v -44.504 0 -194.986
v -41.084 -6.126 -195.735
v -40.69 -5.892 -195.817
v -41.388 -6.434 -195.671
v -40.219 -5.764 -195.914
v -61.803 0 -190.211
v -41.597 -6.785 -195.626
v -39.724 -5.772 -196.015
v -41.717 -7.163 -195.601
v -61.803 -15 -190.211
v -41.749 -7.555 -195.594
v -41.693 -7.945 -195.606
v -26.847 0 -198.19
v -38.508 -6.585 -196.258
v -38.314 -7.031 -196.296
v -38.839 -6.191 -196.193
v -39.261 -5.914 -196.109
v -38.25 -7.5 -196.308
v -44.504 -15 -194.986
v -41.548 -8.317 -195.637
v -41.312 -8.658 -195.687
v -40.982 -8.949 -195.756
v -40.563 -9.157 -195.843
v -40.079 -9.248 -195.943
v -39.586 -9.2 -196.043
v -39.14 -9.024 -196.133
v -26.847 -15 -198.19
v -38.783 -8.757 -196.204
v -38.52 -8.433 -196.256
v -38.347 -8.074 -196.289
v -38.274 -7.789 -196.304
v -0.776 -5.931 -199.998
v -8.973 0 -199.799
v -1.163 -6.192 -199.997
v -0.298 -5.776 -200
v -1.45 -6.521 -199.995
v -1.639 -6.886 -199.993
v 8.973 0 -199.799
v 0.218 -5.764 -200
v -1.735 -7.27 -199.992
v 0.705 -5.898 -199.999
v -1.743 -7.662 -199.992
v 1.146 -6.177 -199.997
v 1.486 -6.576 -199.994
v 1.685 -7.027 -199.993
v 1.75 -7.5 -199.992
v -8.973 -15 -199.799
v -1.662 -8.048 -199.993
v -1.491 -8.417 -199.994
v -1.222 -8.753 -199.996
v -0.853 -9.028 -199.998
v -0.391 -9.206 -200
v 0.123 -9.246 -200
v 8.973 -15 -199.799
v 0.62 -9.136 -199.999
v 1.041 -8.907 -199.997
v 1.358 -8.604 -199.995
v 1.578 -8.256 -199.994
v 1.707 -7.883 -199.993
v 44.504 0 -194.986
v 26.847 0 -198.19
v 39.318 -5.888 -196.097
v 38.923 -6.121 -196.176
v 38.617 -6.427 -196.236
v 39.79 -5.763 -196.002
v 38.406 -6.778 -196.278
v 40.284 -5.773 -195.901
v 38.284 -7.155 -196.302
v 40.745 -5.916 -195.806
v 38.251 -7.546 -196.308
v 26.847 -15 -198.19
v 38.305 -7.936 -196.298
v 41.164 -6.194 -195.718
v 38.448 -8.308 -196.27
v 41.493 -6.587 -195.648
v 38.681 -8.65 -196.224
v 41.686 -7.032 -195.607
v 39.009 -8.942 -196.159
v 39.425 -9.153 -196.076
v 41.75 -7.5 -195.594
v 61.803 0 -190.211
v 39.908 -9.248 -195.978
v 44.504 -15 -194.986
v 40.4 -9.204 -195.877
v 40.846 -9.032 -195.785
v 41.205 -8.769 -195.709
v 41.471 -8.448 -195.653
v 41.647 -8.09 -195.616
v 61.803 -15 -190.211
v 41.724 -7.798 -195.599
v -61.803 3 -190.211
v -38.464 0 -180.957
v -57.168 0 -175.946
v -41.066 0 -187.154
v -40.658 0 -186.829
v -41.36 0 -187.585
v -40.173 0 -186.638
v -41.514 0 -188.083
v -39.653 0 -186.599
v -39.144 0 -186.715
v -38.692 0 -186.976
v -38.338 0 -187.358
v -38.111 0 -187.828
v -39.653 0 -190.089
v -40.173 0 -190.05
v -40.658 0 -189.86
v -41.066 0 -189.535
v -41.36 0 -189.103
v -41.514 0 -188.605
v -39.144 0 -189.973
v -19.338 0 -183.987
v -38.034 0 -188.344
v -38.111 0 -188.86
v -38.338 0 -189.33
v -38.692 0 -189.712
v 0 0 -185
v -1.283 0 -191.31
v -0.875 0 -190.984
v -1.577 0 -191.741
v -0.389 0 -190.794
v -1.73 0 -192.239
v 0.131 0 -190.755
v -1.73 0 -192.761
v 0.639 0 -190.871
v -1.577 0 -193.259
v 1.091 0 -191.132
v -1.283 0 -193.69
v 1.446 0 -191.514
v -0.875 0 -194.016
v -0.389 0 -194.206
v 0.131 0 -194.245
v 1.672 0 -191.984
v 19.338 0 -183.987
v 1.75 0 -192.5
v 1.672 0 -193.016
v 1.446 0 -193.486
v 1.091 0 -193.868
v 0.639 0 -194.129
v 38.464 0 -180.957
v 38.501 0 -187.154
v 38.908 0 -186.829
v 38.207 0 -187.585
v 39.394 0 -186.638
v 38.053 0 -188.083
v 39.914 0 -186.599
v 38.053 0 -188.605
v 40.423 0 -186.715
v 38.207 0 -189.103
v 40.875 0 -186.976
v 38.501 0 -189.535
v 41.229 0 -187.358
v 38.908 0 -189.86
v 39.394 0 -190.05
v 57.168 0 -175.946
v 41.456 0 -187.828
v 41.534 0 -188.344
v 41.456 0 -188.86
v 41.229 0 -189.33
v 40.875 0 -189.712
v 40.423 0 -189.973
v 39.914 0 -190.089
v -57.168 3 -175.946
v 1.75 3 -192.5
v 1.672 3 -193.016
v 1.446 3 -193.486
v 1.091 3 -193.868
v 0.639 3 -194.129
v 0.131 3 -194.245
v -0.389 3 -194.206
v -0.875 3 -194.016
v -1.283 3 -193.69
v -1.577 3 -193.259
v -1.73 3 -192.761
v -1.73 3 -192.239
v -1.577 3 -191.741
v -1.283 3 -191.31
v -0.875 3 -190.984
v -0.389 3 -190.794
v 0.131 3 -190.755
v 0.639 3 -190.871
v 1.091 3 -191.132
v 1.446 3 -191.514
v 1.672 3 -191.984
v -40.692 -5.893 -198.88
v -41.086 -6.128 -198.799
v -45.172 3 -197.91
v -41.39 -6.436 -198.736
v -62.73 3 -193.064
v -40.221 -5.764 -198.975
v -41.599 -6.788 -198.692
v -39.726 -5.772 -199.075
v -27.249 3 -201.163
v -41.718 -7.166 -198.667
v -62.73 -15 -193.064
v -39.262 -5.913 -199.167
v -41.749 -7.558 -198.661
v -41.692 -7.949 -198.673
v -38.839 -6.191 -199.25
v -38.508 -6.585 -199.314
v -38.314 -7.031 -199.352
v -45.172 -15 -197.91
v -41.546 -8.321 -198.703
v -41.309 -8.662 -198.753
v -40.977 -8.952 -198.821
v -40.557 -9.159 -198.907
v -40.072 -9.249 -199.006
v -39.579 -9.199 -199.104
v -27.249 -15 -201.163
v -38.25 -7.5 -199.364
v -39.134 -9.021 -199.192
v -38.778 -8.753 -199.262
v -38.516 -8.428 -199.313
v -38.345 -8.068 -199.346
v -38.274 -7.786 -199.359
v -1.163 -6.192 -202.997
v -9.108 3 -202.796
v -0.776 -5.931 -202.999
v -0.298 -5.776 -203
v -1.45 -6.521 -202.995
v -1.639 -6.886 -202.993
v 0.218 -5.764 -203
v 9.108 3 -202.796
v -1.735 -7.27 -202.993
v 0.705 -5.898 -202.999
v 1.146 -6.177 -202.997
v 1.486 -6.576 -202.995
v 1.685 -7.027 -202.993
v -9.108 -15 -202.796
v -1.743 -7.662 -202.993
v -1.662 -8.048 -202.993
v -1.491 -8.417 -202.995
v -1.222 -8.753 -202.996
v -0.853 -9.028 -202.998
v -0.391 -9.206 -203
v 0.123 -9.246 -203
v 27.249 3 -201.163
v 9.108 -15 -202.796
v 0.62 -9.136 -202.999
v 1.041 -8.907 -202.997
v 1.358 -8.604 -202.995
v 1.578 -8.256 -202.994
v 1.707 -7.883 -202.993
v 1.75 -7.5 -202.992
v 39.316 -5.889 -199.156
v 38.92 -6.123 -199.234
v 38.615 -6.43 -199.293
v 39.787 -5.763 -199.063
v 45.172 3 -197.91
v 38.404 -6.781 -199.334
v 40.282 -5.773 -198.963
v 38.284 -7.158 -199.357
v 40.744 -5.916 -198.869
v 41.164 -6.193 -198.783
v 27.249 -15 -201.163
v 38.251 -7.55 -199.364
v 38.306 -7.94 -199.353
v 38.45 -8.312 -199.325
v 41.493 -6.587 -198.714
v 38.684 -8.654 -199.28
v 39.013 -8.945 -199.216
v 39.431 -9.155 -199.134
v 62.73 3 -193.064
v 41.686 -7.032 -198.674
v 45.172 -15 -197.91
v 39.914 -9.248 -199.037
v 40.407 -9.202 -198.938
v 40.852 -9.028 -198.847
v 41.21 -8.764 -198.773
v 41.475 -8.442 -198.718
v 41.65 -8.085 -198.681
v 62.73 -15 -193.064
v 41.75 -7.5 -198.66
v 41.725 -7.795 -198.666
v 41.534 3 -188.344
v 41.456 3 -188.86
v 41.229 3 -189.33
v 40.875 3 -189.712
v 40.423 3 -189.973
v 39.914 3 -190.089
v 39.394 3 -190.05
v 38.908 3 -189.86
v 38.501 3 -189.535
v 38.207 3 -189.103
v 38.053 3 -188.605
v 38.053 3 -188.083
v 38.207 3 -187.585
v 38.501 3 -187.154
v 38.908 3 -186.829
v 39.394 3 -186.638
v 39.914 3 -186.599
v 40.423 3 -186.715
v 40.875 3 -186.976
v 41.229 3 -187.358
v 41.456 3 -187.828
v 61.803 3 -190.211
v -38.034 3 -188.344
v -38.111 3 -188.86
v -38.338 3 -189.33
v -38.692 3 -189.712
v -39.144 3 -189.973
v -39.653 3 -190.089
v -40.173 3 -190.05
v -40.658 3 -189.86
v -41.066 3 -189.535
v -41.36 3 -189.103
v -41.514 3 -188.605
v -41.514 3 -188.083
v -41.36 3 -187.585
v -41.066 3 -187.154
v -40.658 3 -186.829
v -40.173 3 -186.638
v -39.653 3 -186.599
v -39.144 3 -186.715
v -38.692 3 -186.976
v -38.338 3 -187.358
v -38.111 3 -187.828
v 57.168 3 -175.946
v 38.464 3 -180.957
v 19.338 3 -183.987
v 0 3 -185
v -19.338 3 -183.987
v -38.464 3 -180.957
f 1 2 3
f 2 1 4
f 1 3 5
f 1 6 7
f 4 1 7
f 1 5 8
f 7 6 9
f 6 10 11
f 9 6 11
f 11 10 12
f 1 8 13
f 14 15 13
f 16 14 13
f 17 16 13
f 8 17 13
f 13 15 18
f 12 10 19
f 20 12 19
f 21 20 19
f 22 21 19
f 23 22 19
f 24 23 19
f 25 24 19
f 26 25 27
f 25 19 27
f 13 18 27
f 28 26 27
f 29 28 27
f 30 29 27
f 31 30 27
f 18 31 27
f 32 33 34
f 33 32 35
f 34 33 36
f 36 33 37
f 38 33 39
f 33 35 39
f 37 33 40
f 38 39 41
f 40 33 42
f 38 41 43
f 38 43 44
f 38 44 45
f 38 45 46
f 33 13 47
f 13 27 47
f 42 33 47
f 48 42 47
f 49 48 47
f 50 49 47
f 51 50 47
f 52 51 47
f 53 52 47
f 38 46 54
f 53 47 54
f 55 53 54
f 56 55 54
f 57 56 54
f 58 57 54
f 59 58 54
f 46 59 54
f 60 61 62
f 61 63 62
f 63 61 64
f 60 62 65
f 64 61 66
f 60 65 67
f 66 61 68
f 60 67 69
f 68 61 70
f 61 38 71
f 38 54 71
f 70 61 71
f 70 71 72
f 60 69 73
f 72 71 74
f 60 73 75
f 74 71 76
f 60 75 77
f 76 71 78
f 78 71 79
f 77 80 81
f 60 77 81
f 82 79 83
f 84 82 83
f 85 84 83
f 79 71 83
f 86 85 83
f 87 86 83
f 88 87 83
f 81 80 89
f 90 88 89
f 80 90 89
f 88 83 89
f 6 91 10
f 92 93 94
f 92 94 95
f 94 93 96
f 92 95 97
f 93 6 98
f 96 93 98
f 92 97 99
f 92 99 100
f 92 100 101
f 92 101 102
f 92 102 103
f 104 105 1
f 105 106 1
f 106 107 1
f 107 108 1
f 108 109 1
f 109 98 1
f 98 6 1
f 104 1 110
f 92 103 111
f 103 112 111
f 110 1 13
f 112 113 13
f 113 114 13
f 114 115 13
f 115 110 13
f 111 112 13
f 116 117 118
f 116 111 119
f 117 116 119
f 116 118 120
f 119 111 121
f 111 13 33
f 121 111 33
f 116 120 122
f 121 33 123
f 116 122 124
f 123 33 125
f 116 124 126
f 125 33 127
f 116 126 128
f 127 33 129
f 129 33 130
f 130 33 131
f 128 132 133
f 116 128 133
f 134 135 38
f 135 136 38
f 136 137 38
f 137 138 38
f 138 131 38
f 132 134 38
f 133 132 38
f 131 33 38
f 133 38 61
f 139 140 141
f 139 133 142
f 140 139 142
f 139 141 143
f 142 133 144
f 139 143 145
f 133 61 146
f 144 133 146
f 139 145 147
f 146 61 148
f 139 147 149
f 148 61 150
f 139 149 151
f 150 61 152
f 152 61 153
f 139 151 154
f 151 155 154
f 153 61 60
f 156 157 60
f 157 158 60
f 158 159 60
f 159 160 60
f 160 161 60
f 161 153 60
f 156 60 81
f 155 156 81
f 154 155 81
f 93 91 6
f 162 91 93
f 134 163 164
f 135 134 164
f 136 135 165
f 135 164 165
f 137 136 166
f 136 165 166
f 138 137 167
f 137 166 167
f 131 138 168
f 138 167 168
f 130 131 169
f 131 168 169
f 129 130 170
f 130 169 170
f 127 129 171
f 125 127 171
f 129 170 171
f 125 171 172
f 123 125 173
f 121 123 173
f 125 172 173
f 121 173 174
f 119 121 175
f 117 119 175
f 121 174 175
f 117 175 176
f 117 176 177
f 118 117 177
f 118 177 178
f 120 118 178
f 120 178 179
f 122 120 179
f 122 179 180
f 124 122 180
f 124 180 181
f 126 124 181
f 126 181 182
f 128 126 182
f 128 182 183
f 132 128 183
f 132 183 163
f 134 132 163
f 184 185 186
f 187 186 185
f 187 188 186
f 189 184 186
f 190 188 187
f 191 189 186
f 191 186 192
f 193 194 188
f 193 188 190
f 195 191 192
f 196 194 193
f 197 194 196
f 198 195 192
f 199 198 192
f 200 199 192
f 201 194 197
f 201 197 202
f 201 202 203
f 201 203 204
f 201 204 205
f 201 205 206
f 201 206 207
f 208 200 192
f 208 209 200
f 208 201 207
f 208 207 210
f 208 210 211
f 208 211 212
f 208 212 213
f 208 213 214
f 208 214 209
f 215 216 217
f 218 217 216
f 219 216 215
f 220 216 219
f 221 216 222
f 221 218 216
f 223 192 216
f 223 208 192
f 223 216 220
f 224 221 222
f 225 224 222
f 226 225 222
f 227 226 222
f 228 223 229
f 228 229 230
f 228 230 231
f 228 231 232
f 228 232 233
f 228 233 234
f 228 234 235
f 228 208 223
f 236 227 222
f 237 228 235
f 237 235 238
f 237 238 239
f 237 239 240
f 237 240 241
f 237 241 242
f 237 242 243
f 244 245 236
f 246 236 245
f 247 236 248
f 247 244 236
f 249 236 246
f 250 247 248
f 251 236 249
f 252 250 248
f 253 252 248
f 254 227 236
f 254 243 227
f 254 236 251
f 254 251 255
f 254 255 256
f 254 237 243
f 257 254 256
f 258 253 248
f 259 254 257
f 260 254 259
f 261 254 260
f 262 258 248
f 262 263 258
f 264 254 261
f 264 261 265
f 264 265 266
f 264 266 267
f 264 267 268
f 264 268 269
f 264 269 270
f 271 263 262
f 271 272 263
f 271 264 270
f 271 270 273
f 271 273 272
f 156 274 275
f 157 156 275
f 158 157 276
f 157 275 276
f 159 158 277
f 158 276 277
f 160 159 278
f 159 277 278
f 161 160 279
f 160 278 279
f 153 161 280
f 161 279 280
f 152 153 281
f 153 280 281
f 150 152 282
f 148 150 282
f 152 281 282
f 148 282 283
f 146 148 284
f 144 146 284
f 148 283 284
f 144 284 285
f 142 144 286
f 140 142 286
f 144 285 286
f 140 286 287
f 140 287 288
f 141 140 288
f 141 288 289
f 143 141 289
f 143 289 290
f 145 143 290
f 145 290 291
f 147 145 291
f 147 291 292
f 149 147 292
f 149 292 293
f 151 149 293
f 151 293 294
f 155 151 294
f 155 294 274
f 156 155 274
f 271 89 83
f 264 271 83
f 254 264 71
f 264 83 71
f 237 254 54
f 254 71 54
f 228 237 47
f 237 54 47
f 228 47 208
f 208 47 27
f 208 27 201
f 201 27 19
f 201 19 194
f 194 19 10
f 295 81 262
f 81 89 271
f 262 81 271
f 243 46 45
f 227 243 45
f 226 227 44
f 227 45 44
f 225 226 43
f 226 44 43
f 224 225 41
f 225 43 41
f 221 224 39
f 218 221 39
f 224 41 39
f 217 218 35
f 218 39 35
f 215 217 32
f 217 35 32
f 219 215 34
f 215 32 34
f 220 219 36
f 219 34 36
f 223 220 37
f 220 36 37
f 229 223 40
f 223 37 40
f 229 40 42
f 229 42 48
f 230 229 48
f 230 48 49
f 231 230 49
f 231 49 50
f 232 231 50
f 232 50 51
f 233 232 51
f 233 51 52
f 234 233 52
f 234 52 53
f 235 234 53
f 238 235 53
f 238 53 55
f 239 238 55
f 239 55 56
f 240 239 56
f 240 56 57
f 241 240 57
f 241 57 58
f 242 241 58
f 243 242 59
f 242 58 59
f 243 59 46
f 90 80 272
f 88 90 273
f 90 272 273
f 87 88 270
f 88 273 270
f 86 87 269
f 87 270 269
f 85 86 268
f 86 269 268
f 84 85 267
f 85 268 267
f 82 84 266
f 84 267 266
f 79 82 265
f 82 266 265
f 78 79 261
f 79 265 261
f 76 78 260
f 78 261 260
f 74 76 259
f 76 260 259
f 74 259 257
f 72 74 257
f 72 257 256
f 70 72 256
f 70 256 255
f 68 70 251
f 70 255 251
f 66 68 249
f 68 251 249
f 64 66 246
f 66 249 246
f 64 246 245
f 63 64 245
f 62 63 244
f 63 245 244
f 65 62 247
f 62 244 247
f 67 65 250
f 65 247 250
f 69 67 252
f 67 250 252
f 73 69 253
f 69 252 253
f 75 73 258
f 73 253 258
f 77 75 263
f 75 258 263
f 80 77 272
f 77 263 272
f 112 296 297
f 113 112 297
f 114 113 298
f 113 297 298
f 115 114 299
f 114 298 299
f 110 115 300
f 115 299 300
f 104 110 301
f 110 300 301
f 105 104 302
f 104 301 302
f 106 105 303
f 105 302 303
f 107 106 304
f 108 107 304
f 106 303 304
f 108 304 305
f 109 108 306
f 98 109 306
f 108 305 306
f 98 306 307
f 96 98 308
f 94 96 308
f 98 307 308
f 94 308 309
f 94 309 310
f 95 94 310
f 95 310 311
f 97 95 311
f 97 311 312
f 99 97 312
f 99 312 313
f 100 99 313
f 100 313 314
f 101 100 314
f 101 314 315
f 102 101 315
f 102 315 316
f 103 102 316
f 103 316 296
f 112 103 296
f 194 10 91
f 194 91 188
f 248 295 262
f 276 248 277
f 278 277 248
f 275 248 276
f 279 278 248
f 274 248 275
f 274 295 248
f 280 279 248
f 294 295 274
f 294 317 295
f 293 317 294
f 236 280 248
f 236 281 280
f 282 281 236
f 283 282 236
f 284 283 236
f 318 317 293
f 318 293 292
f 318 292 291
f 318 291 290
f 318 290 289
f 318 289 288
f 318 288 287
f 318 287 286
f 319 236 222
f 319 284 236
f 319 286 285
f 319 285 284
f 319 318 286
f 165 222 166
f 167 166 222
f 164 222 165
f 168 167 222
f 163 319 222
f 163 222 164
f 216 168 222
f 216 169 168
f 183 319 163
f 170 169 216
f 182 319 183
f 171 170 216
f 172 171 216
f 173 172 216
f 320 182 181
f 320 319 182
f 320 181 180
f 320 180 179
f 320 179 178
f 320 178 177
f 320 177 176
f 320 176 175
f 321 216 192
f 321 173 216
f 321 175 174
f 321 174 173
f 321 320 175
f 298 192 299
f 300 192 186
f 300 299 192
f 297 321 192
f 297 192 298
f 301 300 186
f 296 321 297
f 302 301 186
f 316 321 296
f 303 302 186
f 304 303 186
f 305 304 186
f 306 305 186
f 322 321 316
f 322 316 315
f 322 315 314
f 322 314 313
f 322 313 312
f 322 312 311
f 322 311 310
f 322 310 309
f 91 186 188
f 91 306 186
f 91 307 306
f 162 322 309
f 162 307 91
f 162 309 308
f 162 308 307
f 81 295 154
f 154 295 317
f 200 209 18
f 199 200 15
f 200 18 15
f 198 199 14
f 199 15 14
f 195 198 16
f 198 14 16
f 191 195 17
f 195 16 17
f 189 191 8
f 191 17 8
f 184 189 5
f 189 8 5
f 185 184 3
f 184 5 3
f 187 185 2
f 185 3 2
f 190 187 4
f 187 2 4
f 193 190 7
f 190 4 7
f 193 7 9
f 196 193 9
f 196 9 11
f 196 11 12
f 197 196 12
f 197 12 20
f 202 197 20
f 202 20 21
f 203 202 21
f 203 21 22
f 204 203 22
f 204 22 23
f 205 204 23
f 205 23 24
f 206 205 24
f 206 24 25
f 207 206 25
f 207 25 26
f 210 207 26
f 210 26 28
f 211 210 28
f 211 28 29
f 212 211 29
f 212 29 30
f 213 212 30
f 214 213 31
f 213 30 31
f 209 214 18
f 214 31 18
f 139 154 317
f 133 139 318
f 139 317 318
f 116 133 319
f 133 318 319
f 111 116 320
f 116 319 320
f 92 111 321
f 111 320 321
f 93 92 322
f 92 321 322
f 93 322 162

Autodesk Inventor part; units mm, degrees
ref_plane "YZ Plane" through (0, 0, 0) normal (1, 0, 0) x (0, 1, 0)
ref_plane "XZ Plane" through (0, 0, 0) normal (0, 1, 0) x (-1, 0, 0)
sketch "Sketch1" plane through (0, 0, 0) normal (0, 1, 0) x (-1, 0, 0)
  circle A0 centre (0, 0) radius 200
  line L0 (0, 0) -> (0, -200)
  line L1 (0, 0) -> (-61.8034, -190.2113)
  line L2 (0, 0) -> (200, 0) construction
  line L3 (-61.8034, -190.2113) -> (0, 0)
  line L4 (0, 0) -> (61.8034, -190.2113)
  line L5 (0, 0) -> (200, 0) construction
  arc A1 (-61.8034, -190.2113) -> (61.8034, -190.2113) centre (0, 0) ccw
  line L6 (-61.8034, -190.2113) -> (-62.7304, -193.0645)
  line L7 (61.8034, -190.2113) -> (62.7304, -193.0645)
  line L8 (0, -200) -> (0, -203)
  arc A2 (-62.7304, -193.0645) -> (62.7304, -193.0645) centre (0, 0) ccw
  dimension "d0" = 400
  dimension "d1" = 108
  dimension "d2" = 72
  dimension "d4" = 3
  dimension "d5" = 3
  dimension "d6" = 3
extrude "Extrusion1" add sketch "Sketch1" along normal blind 3 and the other way blind 15 contours A0 L8 A2 L6 | L7 A2 L8 A0
sketch "Sketch3" plane through (0, 3, 0) normal (0, 1, 0) x (1, 0, 0)
  arc A0 (62.7304, 193.0645) -> (-62.7304, 193.0645) centre (0, 0) ccw projected
  line L0 (-62.7304, 193.0645) -> (-57.1681, 175.9455)
  line L1 (-62.7304, 193.0645) -> (-61.8034, 190.2113) projected
  line L2 (0, 203) -> (0, 185)
  line L3 (61.8034, 190.2113) -> (62.7304, 193.0645) projected
  line L4 (62.7304, 193.0645) -> (57.1681, 175.9455)
  arc A1 (57.1681, 175.9455) -> (-57.1681, 175.9455) centre (0, 0) ccw
  point P0 (0, 0)
  dimension "d12" = 18
  dimension "d13" = 18
  dimension "d14" = 18
extrude "Extrusion2" add sketch "Sketch3" against normal blind 3
sketch "Sketch4" plane through (0, 3, 0) normal (0, 1, 0) x (1, 0, 0)
  arc A0 (62.7304, 193.0645) -> (-62.7304, 193.0645) centre (0, 0) ccw projected
  line L0 (0, 203) -> (0, 200)
  line L1 (0, 200) -> (0, 192.5)
  circle A1 centre (0, 192.5) radius 1.75
  line L2 (57.1681, 175.9455) -> (62.7304, 193.0645) projected
  line L3 (62.7304, 193.0645) -> (57.1681, 175.9455)
  line L4 (-62.7304, 193.0645) -> (-57.1681, 175.9455) projected
  line L5 (-62.7304, 193.0645) -> (-57.1681, 175.9455)
  line L6 (-57.1681, 175.9455) -> (-62.7304, 193.0645)
  line L7 (-62.7304, 193.0645) -> (-61.8034, 190.2113)
  line L8 (-61.8034, 190.2113) -> (-59.4858, 183.0784)
  line L9 (62.7304, 193.0645) -> (61.8034, 190.2113)
  line L10 (61.8034, 190.2113) -> (59.4858, 183.0784)
  arc A2 (59.4858, 183.0784) -> (-59.4858, 183.0784) centre (0, 0) ccw
  line L11 (0, 192.5) -> (39.7835, 188.3442)
  line L12 (39.7835, 188.3442) -> (0, 192.5)
  line L13 (0, 192.5) -> (-39.7835, 188.3442)
  circle A3 centre (39.7835, 188.3442) radius 1.75
  circle A4 centre (-39.7835, 188.3442) radius 1.75
  point P0 (0, 0)
  dimension "d17" = 3
  dimension "d18" = 7.5
  dimension "d19" = 3.5
  dimension "d28" = 3
  dimension "d29" = 7.5
  dimension "d30" = 3
  dimension "d31" = 7.5
  dimension "d32" = 40
  dimension "d33" = 40
  dimension "d34" = 3.5
  dimension "d35" = 3.5
extrude "Extrusion3" cut sketch "Sketch4" against normal blind 3 contours A1 A2 L1 | L1 A2 A1 | A3 L11 A2 | A2 A3 | L13 A1 A2 | A2 A1 L11 | L11 A1 L13 | L11 A3 A2 | A4 A2 | A2 L13 A4 | A4 L13 A2
ref_plane "Work Plane1" through (0, 0, -200) normal (0, 0, 1) x (1, 0, 0)
sketch "Sketch6" plane through (0, 0, -200) normal (0, 0, 1) x (1, 0, 0)
  line L0 (62.7304, 3) -> (-62.7304, 3) projected
  line L1 (0, 3) -> (0, -15)
  line L2 (-62.7304, -15) -> (62.7304, -15) projected
  line L3 (0, 3) -> (0, -15)
  line L4 (61.8034, -15) -> (-61.8034, -15) projected
  line L5 (0, 3) -> (0, 0)
  line L6 (0, 0) -> (0, -7.5)
  circle A0 centre (0, -7.5) radius 1.75
  line L7 (0, -7.5) -> (-40, -7.5)
  line L8 (-40, -7.5) -> (40, -7.5)
  circle A1 centre (-40, -7.5) radius 1.75
  circle A2 centre (40, -7.5) radius 1.75
  dimension "d23" = 3
  dimension "d24" = 7.5
  dimension "d25" = 3.5
  dimension "d36" = 40
  dimension "d37" = 80
  dimension "d38" = 3.5
  dimension "d39" = 3.5
extrude "Extrusion4" cut sketch "Sketch6" against normal mid plane 10
properties part number "Casing_holder_bottom"
